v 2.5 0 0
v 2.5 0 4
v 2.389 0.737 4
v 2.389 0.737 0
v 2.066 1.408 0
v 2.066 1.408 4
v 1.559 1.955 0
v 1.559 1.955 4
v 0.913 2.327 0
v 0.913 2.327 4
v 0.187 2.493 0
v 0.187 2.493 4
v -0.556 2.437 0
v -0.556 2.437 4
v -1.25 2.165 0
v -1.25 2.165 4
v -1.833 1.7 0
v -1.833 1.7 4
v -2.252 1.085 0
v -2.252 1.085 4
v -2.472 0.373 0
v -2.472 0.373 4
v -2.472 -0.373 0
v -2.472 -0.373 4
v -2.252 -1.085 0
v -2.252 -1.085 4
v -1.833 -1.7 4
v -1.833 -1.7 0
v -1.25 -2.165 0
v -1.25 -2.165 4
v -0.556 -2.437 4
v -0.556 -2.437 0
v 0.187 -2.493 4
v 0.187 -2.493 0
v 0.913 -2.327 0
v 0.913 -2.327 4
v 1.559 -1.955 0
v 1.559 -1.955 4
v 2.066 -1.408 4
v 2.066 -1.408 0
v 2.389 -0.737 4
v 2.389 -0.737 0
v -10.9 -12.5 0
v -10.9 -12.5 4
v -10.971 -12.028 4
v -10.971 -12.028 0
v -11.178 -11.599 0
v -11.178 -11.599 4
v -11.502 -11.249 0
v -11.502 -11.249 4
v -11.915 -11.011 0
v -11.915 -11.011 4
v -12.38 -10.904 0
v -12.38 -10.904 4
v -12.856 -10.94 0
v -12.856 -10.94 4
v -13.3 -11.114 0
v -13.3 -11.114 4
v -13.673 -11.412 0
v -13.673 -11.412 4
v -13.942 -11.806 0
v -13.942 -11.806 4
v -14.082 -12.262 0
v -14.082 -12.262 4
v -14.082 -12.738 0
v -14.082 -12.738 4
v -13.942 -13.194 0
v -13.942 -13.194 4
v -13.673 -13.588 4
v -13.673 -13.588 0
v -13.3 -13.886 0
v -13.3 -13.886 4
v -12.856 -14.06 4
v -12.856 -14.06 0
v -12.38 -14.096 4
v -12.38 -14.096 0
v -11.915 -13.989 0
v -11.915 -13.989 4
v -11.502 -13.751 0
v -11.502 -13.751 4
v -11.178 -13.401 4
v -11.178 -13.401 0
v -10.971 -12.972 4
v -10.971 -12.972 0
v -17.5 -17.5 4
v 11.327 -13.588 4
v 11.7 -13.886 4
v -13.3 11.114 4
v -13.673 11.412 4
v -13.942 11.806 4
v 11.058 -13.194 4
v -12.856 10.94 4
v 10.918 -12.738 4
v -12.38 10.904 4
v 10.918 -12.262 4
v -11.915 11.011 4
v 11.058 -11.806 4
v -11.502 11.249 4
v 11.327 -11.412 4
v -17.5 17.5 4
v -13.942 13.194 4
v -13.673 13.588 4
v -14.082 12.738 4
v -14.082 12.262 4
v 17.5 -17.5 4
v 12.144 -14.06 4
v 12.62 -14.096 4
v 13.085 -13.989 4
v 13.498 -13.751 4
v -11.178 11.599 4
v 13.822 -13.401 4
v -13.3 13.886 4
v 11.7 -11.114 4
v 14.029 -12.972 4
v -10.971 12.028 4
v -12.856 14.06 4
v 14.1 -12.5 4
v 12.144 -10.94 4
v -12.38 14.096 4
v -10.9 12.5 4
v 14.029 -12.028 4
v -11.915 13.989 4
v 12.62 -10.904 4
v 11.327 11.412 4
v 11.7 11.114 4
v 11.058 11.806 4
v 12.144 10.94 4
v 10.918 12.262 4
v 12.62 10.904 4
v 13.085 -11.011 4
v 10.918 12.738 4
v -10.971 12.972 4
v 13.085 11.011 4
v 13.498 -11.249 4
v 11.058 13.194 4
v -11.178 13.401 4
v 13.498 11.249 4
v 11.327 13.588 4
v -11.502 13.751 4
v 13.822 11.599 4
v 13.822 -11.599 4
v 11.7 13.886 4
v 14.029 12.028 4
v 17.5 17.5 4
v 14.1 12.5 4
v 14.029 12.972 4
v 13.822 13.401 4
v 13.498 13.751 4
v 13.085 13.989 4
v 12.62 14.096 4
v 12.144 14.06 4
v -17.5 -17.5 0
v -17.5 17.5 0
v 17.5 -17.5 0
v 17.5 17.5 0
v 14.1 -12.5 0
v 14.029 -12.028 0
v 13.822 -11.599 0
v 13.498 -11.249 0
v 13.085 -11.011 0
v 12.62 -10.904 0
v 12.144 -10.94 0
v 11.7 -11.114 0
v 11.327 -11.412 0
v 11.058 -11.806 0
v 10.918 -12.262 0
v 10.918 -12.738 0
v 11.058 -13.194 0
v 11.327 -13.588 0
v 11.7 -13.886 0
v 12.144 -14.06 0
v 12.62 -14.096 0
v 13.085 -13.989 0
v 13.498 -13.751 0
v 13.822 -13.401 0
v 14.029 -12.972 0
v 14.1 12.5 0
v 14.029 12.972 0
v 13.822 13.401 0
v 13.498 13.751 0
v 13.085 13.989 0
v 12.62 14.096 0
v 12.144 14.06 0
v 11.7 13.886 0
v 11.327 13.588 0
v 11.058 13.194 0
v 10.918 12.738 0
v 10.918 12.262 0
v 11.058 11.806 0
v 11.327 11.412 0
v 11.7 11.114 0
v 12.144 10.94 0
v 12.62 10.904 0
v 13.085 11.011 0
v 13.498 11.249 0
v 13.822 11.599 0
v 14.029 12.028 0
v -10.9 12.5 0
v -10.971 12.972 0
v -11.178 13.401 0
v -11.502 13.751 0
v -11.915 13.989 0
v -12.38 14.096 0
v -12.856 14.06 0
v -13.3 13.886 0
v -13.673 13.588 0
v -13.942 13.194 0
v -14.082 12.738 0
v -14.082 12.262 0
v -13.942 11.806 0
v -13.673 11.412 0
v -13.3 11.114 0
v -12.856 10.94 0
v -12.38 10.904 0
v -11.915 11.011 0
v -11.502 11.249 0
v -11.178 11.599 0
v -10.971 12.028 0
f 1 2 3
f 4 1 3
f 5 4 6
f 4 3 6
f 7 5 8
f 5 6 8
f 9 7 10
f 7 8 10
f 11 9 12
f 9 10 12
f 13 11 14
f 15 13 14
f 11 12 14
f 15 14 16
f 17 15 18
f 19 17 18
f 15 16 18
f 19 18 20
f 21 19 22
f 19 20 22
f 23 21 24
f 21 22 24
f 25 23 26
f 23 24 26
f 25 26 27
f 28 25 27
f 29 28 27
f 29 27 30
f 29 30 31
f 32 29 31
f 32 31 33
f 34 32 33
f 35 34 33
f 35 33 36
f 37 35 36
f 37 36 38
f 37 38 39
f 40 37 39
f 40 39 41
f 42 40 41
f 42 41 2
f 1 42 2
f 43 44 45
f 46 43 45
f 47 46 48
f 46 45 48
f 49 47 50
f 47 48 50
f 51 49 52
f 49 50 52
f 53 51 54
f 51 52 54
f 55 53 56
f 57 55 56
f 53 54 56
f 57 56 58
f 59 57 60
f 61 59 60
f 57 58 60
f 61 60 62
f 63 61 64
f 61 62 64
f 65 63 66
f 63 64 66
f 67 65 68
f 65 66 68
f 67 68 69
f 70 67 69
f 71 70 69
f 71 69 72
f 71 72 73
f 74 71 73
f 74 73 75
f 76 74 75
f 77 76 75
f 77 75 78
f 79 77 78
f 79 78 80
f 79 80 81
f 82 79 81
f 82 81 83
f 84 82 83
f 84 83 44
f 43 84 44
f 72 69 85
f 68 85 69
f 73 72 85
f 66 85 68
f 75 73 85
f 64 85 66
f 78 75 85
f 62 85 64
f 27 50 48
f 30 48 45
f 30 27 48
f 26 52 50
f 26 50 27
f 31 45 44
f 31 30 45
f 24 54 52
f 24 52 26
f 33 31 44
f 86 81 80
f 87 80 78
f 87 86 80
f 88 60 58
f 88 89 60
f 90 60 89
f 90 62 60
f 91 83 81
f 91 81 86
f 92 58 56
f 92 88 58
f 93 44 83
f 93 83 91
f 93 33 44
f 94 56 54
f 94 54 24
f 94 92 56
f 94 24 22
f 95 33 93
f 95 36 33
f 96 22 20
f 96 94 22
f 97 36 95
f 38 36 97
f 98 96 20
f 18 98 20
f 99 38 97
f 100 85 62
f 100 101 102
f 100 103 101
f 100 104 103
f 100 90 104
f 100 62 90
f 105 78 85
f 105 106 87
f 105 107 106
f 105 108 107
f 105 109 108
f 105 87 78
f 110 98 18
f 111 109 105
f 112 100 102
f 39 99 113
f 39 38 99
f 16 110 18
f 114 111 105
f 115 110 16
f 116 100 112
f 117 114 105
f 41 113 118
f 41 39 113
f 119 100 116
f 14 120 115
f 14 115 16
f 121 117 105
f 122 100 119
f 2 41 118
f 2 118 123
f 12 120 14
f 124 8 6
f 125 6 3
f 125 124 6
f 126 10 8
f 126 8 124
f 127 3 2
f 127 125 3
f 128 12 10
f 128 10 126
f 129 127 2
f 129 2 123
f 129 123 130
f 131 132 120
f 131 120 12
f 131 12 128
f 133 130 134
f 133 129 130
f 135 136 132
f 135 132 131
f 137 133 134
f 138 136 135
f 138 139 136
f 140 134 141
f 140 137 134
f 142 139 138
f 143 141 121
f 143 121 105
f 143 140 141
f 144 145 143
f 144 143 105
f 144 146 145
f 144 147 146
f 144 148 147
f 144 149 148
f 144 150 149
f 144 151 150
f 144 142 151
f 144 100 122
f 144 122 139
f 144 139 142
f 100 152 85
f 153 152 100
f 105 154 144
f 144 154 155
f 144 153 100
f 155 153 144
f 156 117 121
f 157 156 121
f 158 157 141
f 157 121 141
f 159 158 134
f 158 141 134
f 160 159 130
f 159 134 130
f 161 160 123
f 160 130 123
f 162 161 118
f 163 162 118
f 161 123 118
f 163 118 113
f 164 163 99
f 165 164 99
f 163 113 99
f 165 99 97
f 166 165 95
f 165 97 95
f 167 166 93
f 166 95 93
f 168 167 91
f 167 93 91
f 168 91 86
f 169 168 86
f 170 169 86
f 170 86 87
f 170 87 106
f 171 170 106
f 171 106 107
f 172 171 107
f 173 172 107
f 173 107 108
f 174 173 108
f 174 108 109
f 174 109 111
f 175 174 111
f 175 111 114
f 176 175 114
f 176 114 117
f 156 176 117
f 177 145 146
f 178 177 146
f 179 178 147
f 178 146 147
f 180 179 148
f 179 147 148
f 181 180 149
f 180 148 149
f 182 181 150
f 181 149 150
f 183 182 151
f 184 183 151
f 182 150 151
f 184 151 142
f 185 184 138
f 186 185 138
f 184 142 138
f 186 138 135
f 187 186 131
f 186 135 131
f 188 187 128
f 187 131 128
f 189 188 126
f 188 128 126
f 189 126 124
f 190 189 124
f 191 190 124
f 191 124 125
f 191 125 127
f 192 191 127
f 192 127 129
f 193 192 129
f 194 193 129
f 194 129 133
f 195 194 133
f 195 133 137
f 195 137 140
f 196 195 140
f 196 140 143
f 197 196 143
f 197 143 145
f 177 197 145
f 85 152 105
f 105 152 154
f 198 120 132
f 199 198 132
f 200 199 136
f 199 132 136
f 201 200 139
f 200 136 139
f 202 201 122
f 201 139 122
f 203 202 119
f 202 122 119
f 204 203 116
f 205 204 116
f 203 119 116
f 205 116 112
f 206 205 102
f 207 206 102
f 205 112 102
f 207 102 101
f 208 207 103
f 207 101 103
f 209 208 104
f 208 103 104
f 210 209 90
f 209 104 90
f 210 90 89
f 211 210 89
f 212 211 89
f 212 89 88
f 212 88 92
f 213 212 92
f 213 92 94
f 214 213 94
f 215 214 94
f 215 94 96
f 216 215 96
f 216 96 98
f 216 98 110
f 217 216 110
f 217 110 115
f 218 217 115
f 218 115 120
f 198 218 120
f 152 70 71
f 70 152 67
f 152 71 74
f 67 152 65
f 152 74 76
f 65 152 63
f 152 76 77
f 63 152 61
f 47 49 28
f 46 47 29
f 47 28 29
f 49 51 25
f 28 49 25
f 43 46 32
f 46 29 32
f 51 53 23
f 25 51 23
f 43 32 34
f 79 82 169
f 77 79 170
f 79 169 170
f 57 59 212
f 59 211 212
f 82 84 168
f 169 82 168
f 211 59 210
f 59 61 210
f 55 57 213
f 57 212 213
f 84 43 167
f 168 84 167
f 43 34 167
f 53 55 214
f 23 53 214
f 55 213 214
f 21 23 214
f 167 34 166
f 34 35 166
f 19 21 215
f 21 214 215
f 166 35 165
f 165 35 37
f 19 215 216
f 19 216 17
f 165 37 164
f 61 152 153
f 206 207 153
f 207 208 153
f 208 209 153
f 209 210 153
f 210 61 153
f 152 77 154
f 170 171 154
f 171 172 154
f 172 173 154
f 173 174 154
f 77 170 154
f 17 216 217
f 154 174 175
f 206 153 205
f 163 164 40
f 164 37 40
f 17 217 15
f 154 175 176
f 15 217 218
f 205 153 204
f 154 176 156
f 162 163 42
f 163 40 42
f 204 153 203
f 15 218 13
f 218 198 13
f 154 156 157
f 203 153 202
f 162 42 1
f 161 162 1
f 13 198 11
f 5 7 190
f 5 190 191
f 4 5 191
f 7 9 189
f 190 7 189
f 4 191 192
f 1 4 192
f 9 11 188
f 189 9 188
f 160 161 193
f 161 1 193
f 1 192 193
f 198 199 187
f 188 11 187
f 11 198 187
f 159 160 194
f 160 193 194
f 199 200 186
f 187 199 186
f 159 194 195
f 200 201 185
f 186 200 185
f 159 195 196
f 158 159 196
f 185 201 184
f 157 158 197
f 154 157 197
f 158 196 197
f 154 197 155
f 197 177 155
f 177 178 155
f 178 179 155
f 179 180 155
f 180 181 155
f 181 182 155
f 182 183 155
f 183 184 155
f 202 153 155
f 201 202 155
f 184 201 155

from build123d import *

# Parameters (mm, degrees)
SKETCH1_W           = 35
SKETCH1_H           = 35
BOSS_EXTRUDE1_DEPTH = 4
SKETCH3_R           = 1.6
DOWEL_CUT_DEPTH     = 26.069902273
SKETCH2_R           = 2.5
SCREW_CUT_DEPTH     = 26.069902273


with BuildPart() as part:
    # Sketch1 → Boss-Extrude1 (new body)
    with BuildSketch(Plane.XY):
        Rectangle(SKETCH1_W, SKETCH1_H)
    extrude(amount=BOSS_EXTRUDE1_DEPTH)

    # Sketch3 → Dowel cut (cut, through all)
    with BuildSketch(Plane.XY.offset(4)):
        with Locations((-12.5, 12.5)):
            Circle(SKETCH3_R)
        with Locations((12.5, 12.5)):
            Circle(SKETCH3_R)
        with Locations((12.5, -12.5)):
            Circle(SKETCH3_R)
        with Locations((-12.5, -12.5)):
            Circle(SKETCH3_R)
    extrude(amount=-DOWEL_CUT_DEPTH, mode=Mode.SUBTRACT)

    # Sketch2 → Screw cut (cut, through all)
    with BuildSketch(Plane.XY.offset(4)):
        Circle(SKETCH2_R)
    extrude(amount=-SCREW_CUT_DEPTH, mode=Mode.SUBTRACT)


solid = part.part
